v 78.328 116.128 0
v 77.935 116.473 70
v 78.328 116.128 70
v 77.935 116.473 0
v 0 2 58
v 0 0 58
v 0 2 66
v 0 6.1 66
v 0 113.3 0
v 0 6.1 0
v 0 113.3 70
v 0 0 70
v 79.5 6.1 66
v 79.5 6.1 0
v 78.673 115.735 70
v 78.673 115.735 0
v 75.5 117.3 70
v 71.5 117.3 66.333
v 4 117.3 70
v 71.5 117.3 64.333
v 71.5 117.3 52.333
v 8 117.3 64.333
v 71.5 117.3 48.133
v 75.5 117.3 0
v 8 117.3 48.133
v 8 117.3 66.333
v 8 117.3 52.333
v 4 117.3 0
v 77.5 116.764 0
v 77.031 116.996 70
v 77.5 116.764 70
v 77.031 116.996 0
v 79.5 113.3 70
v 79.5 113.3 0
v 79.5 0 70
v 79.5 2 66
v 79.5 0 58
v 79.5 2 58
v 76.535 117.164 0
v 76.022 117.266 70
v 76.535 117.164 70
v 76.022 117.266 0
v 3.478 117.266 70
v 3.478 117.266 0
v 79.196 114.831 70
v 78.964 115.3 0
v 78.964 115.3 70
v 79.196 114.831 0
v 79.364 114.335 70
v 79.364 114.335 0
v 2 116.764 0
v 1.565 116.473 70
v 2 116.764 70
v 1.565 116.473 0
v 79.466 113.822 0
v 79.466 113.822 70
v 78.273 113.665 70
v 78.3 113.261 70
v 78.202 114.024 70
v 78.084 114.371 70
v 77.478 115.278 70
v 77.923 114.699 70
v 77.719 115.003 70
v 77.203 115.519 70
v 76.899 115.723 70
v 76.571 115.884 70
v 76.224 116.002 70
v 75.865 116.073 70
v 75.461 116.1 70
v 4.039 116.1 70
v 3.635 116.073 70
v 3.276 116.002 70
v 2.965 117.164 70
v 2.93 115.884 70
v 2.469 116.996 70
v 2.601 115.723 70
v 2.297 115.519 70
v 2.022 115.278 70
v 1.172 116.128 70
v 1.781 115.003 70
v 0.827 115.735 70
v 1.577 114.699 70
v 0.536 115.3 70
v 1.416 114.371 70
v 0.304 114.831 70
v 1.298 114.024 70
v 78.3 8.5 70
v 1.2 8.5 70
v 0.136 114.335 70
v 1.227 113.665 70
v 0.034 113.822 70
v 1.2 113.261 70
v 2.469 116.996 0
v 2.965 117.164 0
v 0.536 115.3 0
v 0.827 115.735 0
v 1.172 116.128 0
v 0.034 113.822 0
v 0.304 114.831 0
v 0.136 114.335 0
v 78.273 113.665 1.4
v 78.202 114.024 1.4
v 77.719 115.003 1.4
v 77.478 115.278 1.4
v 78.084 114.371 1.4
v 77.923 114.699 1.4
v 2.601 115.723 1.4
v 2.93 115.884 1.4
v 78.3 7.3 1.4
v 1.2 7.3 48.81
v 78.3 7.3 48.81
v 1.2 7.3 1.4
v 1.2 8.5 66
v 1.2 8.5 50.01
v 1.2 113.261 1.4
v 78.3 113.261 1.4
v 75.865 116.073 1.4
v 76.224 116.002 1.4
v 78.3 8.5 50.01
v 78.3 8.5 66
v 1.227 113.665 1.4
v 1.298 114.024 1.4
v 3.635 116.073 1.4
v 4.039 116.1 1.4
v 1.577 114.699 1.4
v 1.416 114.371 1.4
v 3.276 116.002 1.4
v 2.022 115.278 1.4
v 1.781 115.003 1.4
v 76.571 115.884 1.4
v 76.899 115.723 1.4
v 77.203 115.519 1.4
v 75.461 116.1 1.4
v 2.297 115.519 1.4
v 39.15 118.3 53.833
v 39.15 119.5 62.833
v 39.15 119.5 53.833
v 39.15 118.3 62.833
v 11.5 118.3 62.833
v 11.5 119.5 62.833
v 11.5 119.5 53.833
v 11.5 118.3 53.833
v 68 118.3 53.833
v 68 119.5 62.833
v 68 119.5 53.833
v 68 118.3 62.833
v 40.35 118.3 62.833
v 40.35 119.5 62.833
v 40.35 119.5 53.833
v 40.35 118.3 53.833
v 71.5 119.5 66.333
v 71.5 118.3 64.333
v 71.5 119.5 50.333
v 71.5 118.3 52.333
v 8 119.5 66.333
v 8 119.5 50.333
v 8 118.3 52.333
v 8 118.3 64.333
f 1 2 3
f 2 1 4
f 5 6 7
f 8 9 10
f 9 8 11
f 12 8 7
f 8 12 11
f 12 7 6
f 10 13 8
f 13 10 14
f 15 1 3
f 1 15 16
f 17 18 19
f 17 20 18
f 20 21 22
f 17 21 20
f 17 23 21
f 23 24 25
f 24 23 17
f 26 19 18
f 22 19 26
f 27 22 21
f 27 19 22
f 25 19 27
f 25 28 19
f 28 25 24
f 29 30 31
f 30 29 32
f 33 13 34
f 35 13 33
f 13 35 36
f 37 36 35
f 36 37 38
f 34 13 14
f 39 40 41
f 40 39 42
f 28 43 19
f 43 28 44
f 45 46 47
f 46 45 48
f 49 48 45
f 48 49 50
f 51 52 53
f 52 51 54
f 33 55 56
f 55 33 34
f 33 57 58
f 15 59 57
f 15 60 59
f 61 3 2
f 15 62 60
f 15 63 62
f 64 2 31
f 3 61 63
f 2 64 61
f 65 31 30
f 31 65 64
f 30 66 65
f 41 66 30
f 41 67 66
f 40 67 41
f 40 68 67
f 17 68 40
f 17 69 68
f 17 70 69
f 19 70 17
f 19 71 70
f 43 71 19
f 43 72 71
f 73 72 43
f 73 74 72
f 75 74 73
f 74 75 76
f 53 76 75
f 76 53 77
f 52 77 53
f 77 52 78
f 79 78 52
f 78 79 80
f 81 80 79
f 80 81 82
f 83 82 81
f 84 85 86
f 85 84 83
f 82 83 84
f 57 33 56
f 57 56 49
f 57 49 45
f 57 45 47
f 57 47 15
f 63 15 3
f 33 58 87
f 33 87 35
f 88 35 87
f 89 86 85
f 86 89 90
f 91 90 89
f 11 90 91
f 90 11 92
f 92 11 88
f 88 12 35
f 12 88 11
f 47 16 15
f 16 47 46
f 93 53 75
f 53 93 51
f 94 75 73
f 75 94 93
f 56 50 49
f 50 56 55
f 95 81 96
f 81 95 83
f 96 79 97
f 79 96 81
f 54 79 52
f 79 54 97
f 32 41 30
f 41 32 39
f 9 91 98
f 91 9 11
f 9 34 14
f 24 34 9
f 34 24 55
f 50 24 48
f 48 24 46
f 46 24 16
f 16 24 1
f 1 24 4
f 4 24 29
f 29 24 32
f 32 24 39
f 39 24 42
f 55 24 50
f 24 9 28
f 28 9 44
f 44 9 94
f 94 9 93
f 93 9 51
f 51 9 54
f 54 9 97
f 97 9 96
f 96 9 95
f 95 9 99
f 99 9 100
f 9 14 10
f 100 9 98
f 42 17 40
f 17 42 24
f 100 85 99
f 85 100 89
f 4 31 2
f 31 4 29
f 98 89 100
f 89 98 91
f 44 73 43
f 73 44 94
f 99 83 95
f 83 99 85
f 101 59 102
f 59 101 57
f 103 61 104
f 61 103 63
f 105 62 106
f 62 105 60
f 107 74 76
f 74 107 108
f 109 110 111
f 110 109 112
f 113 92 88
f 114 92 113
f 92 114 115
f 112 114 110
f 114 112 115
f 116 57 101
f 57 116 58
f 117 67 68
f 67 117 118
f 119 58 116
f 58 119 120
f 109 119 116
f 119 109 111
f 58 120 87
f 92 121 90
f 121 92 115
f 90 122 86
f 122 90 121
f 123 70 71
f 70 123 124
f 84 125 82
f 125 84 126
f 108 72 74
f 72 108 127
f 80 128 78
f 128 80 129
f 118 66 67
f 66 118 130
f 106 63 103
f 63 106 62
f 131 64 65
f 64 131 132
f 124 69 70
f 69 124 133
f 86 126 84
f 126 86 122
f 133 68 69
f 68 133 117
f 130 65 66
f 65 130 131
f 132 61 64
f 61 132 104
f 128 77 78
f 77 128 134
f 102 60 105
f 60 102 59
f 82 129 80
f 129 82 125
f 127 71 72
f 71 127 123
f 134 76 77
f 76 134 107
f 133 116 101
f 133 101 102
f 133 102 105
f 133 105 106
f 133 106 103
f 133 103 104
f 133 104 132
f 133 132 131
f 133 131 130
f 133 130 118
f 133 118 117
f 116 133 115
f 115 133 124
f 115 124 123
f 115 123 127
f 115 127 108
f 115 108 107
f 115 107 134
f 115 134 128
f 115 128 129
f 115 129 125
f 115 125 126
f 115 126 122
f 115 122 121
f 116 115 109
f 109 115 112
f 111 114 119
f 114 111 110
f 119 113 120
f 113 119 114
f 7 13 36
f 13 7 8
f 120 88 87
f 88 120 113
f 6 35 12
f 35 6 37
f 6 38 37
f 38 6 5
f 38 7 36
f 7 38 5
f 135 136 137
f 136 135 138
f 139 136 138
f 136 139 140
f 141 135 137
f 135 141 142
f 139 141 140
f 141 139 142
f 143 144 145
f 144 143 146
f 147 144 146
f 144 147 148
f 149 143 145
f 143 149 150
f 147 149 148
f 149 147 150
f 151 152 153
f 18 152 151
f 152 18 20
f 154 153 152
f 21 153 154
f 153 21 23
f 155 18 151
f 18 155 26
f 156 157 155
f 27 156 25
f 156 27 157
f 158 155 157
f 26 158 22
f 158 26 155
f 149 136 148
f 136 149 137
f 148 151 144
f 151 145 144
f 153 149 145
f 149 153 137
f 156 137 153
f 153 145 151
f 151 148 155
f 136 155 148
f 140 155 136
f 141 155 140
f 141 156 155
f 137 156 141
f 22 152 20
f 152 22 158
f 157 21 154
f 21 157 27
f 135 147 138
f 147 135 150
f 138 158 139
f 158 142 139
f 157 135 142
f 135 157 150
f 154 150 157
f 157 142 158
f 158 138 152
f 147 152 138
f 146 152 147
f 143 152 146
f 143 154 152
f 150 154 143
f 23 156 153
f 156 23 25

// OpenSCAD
// ============================================================
//  Kleinteilebox für Eurobox 60x40 + Einhängewand (Stege)
//  - Länge/Breite im festen Raster (Haken + Etiketteneinschub eingerechnet)
//  - Höhe fest, Tragsteg immer gleich (Höhe, Tiefe, Position)
//  - Leichtbau: dünne Wände; massiver Tragrahmen oben (Haken + Rand)
//  - Bodenstärke automatisch aus der Traglast (Metallschrauben)
//  Koordinaten: X = Breite (entlang der Wand)
//               Y = Länge/Tiefe (Y=0 = Wandseite/Haken, Ltot = Vorderseite)
//               Z = Höhe (Druckrichtung, Box steht aufrecht auf dem Bett)
//  Quelle der Wahrheit für alle STL/3MF in diesem Ordner.
// ============================================================

/* [Ausgabe] */
// box = die Box, modifier = Volumen der Tragzone (nur für den Slicer),
// support_zone = Bereich, in dem der Slicer Stützen erzeugen soll (Support-Enforcer, nur für den Slicer)
part = "box"; // [box, modifier, support_zone]

/* [Box-Größe in Rastereinheiten] */
units_w = 2;      // Breite  (entlang der Wand) in Rastereinheiten
units_l = 3;      // Länge   (von der Wand weg)  in Rastereinheiten

/* [Raster / Eurobox] */
grid    = 40;     // Rastermaß [mm]
tol     = 0.5;    // Spiel pro Box (Box ist um tol kleiner als ihr Raster)
eb_x    = 555;    // Innenmaß Eurobox, lange Seite (Herstellerangabe 55,5 cm; am Boden wegen Schräge evtl. kleiner -> nachmessen!)
eb_y    = 355;    // Innenmaß Eurobox, kurze Seite (Herstellerangabe 35,5 cm; am Boden evtl. kleiner)
eb_h    = 105;    // Innenhöhe Eurobox (Herstellerangabe 10,5 cm; Box 60x40x12 cm, 20 l)

/* [Feste Höhe] */
H       = 70;     // Gesamthöhe Box inkl. Haken (für ALLE Boxen gleich)

/* [Wände / Leichtbau] */
wall      = 1.2;  // Wandstärke der leichten Box (3 Perimeter à 0,4)
wall_band = 2.4;  // Wandstärke im Tragrahmen oben (6 Perimeter; Modifier macht den Rest massiv)
band_h    = 20;   // Höhe des Tragrahmens von der Oberkante nach unten [mm]. Mehr = mehr massive Schichten, Gesamthöhe H bleibt
band_ring = false; // false = nur die Rückwand (Hakenseite) wird im Tragrahmen dick, Seiten/Front bleiben leicht (Standard);
                   // true  = Tragrahmen läuft um alle vier Wände (steifer Rand, aber ca. 18 cm³ = 23 g mehr bei 2x3)
floor_t   = 0;    // Bodenstärke [mm]; 0 = automatisch aus Traglast und Spannweite
r         = 4;    // Eckradius vorne (außen)

/* [Last (für die automatische Bodenstärke)] */
rho_bulk = 4.0;   // Schüttdichte Füllgut, lose Metallschrauben [kg/Liter]
E_mod    = 1800;  // E-Modul PETG, gedruckt [MPa]
sag_max  = 2.0;   // zulässige Bodendurchbiegung bei voller Box [mm]

/* [Tragsteg / Haken – für alle Boxen identisch] */
rail_pitch = 76;  // Stegabstand an der Wand, Oberkante zu Oberkante
rail_t     = 2.0; // Dicke des Wandstegs                               -> nachmessen!
hook_clear = 2.1; // Luft im Hakenschlitz
hook_drop  = 8;   // Steglänge: wie weit der Haken hinter den Steg greift
hook_t     = 2.0; // Dicke der Hakenlippe
hook_top   = 4.0; // Dicke des Hakendachs (Tragkante)
support_rib = false; // Abstützleiste unten hinten (standardmäßig aus)
rib_h      = 6;   // Höhe der Abstützleiste

/* [Trennwände (optional)] */
n_laengs = 0;     // Anzahl Längswände (laufen von hinten nach vorne, teilen die Breite)
n_quer   = 0;     // Anzahl Querwände  (laufen von links nach rechts, teilen die Länge)
div_t    = 1.2;   // Dicke Trennwand
div_h    = 60;    // Höhe Trennwand (wird auf max. Boxhöhe H begrenzt)

/* [Beschriftungseinschub vorne] */
label_on   = true;
label_h    = 12;  // Etikettenhöhe [mm] [6, 9, 12, 19, 24]
label_w    = 0;   // Etikettenbreite [mm]; 0 = automatisch: Boxbreite − 20 mm
label_gap  = 1.0; // Spalt für das Etikett (Dicke Etikett + Luft)
label_lip  = 1.2; // Dicke der vorderen Halteleiste
label_ovl  = 1.5; // wie weit die Halteleiste das Etikett oben/unten/seitlich überdeckt
label_rail = 2.0; // Höhe der oberen/unteren Rahmenleiste
label_open_left  = true;  // Einschub links offen
label_open_right = true;  // Einschub rechts offen (false = Anschlag rechts)
label_bridge_max = 40;    // max. freie Brückenlänge der oberen Leiste; darüber dünne Stützstege
label_post_w     = 1.2;   // Breite der Stützstege im Sichtfenster
label_top_margin = 2;     // Mindestabstand Rahmen-Oberkante zum Boxrand

$fn = 48;

// ---------- abgeleitete Maße ----------
hook_over  = hook_t + rail_t + hook_clear;          // Hakenüberstand nach hinten
front_over = label_on ? label_gap + label_lip : 0;  // Überstand Etikettenrahmen vorne
W    = units_w * grid - tol;                        // Außenbreite
Ltot = units_l * grid - tol;                        // Außenlänge inkl. Haken+Rahmen (= Rasterfläche)
y0   = hook_over;                                   // Rückwand-Außenseite
L    = Ltot - hook_over - front_over;               // Länge des Boxkörpers
yf   = y0 + L;                                      // Vorderwand-Außenseite

lw     = label_w > 0 ? label_w : W - 20;            // Einschubbreite
fw     = lw + 2*label_rail;                         // Rahmenbreite außen
fh     = label_h + 2*label_rail;                    // Rahmenhöhe (oben geschlossen)
// Rahmen mittig im oberen Drittel; bei hohen Etiketten rutscht er nach unten
fz_top = min(H - H/6 + fh/2, H - label_top_margin);
fz_bot = fz_top - fh;                               // Unterkante Rahmen
dh     = min(div_h, H);                             // Trennwandhöhe begrenzt

// ---------- Bodenstärke aus der Traglast ----------
// Rechteckplatte, allseitig gelenkig gelagert, Gleichlast (Timoshenko, ν = 0,3):
//   Durchbiegung f = a' * q * b^4 / (E * t^3),  a' = 10,92 * alpha(Seitenverhältnis)
function plate_a(v) = lookup(v, [[1.0, 0.04434], [1.2, 0.06159], [1.4, 0.07699], [1.6, 0.09064],
                                  [1.8, 0.10167], [2.0, 0.11062], [3.0, 0.13355], [5.0, 0.14218]]);
iw0   = W - 2*wall;                                  // Innenbreite
il0   = L - 2*wall;                                  // Innenlänge
bs    = min(iw0, il0);                               // kurze Spannweite
as    = max(iw0, il0);
q_f   = rho_bulk * 9.81e-6 * (H - 2);                // Bodendruck bei voller Box [N/mm²]
t_req = pow(plate_a(as / bs) * q_f * pow(bs, 4) / (E_mod * sag_max), 1/3);
ft    = floor_t > 0 ? floor_t : max(1.0, ceil(t_req / 0.2 - 0.001) * 0.2);   // Schichtraster 0,2

zl    = H - hook_top - hook_drop;                    // Unterkante der Hakenlippe
dr    = wall_band - wall;                            // Höhe des 45°-Übergangs zum Tragrahmen
zb    = H - band_h - dr;                             // Beginn des Übergangs
vin   = iw0 * il0 * (H - ft) / 1e6;                  // Innenvolumen [Liter] (ohne Tragrahmen-Verengung)

// ---------- Prüfungen ----------
echo(str("Box außen: ", W, " x ", Ltot, " x ", H, " mm (Körper ", L, " mm tief)"));
echo(str("Raster in Eurobox: ", floor(eb_x/grid), " x ", floor(eb_y/grid), " Einheiten"));
echo(str("Boden: ", ft, " mm (nötig ", t_req, " mm für ", sag_max, " mm Durchbiegung); Innenvolumen ",
         vin, " l, voll mit Schrauben ca. ", vin*rho_bulk, " kg"));
echo(str("Tragrahmen: Z ", H - band_h, "–", H, " mm (", band_h, " mm, ", round(band_h/0.2), " Schichten bei 0,2 mm), Wand ", wall_band, " mm"));
if (label_on) {
    echo(str("Etikett: ", lw, " x ", label_h, " mm, Rahmen Z ", fz_bot, "–", fz_top, " mm"));
}
assert(H <= eb_h, "Box ist höher als die Eurobox!");
assert(H <= rail_pitch, "Box ist höher als der Stegabstand – kollidiert mit der Reihe darunter!");
assert(L > 2*wall_band + 5, "Box zu kurz.");
assert(band_h >= hook_top + hook_drop + 2, "Tragrahmen muss mindestens bis 2 mm unter die Hakenlippe reichen.");
assert(zb > ft + 5, "Tragrahmen zu hoch für die Box (band_h verkleinern).");
assert(wall_band >= wall, "wall_band darf nicht dünner als wall sein.");
assert(len(search(label_h, [6, 9, 12, 19, 24])) > 0, "label_h muss 6, 9, 12, 19 oder 24 sein.");
assert(!label_on || fw <= W, "Etikett breiter als die Box.");
assert(!label_on || fz_bot > ft, "Etikett zu hoch für die Box.");

// ---------- Geometrie ----------
// Grundriss: hinten eckig (Hakenanschluss), vorne gerundet
module footprint(w, l, rr) {
    hull() {
        square([w, l - rr]);
        translate([rr, l - rr])     circle(rr);
        translate([w - rr, l - rr]) circle(rr);
    }
}

// Hohlraum-Grundriss: Rückwand hat Stärke t_rear, die übrigen Wände t_side (beide Formen konvex -> hull möglich)
module cavity2d(t_rear, t_side) {
    intersection() {
        offset(r = -t_side) footprint(W, L, r);
        translate([-1, t_rear]) square([W + 2, L]);
    }
}

module body() {
    ts = band_ring ? wall_band : wall;      // Seiten/Front im Tragrahmen
    translate([0, y0, 0]) difference() {
        linear_extrude(H) footprint(W, L, r);
        // Hohlraum der leichten Box (dünne Wand)
        translate([0, 0, ft]) linear_extrude(zb - ft + 0.01) cavity2d(wall, wall);
        // 45°-Übergang zur dicken Wand (Hohlraum verjüngt sich nach oben, druckbar ohne Stütze)
        hull() {
            translate([0, 0, zb])      linear_extrude(0.01) cavity2d(wall, wall);
            translate([0, 0, zb + dr]) linear_extrude(0.01) cavity2d(wall_band, ts);
        }
        // Hohlraum im Tragrahmen (dicke Rückwand)
        translate([0, 0, zb + dr]) linear_extrude(H) cavity2d(wall_band, ts);
    }
}

// Volumen der Tragzone: im Slicer als Modifier mit 100 % Füllung und mehr Wänden
module modifier_volume() {
    translate([-0.5, 0, zb]) cube([W + 1, yf, H - zb + 0.4]);
}

module hook() {
    // Dach: liegt auf dem Wandsteg auf
    translate([0, 0, H - hook_top])
        cube([W, hook_over + wall_band, hook_top]);
    // Lippe: greift hinter den Steg (vollflächig über die ganze Breite)
    translate([0, 0, H - hook_top - hook_drop])
        cube([W, hook_t, hook_drop + hook_top]);
    // Abstützleiste unten (optional)
    if (support_rib)
        cube([W, hook_over + wall, rib_h]);
}

// gleichmäßig verteilte Trennwände
module dividers() {
    iw = W - 2*wall;                 // Innenbreite
    il = L - 2*wall;                 // Innenlänge
    e  = 0.3;                        // Überlappung in die Außenwand
    if (n_laengs > 0) {
        c = (iw - n_laengs*div_t) / (n_laengs + 1);   // Fachbreite
        for (i = [1 : n_laengs])
            translate([wall + i*c + (i-1)*div_t, y0 + wall - e, 0])
                cube([div_t, il + 2*e, dh]);
    }
    if (n_quer > 0) {
        c = (il - n_quer*div_t) / (n_quer + 1);       // Fachlänge
        for (i = [1 : n_quer])
            translate([wall - e, y0 + wall + i*c + (i-1)*div_t, 0])
                cube([iw + 2*e, div_t, dh]);
    }
}

// Etiketteneinschub: Rahmen auf der Vorderwand, oben geschlossen,
// Etikett wird seitlich eingeschoben
module label_holder() {
    x0 = (W - fw) / 2;
    d  = front_over;
    zs = fz_bot + label_rail;                 // Unterkante Schacht
    // Sichtfenster
    wx0 = x0 + label_rail + label_ovl;
    ww  = fw - 2*(label_rail + label_ovl);
    wz0 = zs + label_ovl;
    wh  = label_h - 2*label_ovl;
    // Stützstege, damit die obere Leiste nicht zu weit frei überbrückt
    n_posts = max(0, ceil(ww / label_bridge_max) - 1);
    seg     = (ww - n_posts*label_post_w) / (n_posts + 1);
    difference() {
        translate([x0, yf - 0.01, fz_bot]) cube([fw, d + 0.01, fh]);
        // Schacht für das Etikett (seitlich offen)
        sx0 = label_open_left  ? x0 - 1 : x0 + label_rail;
        sx1 = label_open_right ? x0 + fw + 1 : x0 + fw - label_rail;
        translate([sx0, yf, zs]) cube([sx1 - sx0, label_gap, label_h]);
        // Sichtfenster in der Halteleiste, unterbrochen von Stützstegen
        for (i = [0 : n_posts])
            translate([wx0 + i*(seg + label_post_w), yf + label_gap - 0.01, wz0])
                cube([seg, label_lip + 0.1, wh]);
    }
    // 45°-Fase unter dem Rahmen -> druckbar ohne Stützen
    hull() {
        translate([x0, yf - 0.01, fz_bot]) cube([fw, d + 0.01, 0.01]);
        translate([x0, yf - 0.01, fz_bot - d]) cube([fw, 0.01, 0.01]);
    }
}

// Bereich für Stützen unter der Hakenlippe (in der 3MF ein Support-Enforcer):
// Die Lippe beginnt frei in der Luft, nur dort soll der Slicer Stützen bis zum Bett bauen.
// Der Quader liegt um die Lippenunterkante (Z) und über der Lippenfläche (X, Y).
module support_zone() {
    translate([0, -0.5, zl - 1]) cube([W, hook_t + 1, 2]);
}

module box() {
    union() {
        body();
        hook();
        dividers();
        if (label_on) label_holder();
    }
}

if (part == "box") box();
else if (part == "modifier") modifier_volume();
else if (part == "support_zone") support_zone();
else assert(false, "part muss box, modifier oder support_zone sein.");
